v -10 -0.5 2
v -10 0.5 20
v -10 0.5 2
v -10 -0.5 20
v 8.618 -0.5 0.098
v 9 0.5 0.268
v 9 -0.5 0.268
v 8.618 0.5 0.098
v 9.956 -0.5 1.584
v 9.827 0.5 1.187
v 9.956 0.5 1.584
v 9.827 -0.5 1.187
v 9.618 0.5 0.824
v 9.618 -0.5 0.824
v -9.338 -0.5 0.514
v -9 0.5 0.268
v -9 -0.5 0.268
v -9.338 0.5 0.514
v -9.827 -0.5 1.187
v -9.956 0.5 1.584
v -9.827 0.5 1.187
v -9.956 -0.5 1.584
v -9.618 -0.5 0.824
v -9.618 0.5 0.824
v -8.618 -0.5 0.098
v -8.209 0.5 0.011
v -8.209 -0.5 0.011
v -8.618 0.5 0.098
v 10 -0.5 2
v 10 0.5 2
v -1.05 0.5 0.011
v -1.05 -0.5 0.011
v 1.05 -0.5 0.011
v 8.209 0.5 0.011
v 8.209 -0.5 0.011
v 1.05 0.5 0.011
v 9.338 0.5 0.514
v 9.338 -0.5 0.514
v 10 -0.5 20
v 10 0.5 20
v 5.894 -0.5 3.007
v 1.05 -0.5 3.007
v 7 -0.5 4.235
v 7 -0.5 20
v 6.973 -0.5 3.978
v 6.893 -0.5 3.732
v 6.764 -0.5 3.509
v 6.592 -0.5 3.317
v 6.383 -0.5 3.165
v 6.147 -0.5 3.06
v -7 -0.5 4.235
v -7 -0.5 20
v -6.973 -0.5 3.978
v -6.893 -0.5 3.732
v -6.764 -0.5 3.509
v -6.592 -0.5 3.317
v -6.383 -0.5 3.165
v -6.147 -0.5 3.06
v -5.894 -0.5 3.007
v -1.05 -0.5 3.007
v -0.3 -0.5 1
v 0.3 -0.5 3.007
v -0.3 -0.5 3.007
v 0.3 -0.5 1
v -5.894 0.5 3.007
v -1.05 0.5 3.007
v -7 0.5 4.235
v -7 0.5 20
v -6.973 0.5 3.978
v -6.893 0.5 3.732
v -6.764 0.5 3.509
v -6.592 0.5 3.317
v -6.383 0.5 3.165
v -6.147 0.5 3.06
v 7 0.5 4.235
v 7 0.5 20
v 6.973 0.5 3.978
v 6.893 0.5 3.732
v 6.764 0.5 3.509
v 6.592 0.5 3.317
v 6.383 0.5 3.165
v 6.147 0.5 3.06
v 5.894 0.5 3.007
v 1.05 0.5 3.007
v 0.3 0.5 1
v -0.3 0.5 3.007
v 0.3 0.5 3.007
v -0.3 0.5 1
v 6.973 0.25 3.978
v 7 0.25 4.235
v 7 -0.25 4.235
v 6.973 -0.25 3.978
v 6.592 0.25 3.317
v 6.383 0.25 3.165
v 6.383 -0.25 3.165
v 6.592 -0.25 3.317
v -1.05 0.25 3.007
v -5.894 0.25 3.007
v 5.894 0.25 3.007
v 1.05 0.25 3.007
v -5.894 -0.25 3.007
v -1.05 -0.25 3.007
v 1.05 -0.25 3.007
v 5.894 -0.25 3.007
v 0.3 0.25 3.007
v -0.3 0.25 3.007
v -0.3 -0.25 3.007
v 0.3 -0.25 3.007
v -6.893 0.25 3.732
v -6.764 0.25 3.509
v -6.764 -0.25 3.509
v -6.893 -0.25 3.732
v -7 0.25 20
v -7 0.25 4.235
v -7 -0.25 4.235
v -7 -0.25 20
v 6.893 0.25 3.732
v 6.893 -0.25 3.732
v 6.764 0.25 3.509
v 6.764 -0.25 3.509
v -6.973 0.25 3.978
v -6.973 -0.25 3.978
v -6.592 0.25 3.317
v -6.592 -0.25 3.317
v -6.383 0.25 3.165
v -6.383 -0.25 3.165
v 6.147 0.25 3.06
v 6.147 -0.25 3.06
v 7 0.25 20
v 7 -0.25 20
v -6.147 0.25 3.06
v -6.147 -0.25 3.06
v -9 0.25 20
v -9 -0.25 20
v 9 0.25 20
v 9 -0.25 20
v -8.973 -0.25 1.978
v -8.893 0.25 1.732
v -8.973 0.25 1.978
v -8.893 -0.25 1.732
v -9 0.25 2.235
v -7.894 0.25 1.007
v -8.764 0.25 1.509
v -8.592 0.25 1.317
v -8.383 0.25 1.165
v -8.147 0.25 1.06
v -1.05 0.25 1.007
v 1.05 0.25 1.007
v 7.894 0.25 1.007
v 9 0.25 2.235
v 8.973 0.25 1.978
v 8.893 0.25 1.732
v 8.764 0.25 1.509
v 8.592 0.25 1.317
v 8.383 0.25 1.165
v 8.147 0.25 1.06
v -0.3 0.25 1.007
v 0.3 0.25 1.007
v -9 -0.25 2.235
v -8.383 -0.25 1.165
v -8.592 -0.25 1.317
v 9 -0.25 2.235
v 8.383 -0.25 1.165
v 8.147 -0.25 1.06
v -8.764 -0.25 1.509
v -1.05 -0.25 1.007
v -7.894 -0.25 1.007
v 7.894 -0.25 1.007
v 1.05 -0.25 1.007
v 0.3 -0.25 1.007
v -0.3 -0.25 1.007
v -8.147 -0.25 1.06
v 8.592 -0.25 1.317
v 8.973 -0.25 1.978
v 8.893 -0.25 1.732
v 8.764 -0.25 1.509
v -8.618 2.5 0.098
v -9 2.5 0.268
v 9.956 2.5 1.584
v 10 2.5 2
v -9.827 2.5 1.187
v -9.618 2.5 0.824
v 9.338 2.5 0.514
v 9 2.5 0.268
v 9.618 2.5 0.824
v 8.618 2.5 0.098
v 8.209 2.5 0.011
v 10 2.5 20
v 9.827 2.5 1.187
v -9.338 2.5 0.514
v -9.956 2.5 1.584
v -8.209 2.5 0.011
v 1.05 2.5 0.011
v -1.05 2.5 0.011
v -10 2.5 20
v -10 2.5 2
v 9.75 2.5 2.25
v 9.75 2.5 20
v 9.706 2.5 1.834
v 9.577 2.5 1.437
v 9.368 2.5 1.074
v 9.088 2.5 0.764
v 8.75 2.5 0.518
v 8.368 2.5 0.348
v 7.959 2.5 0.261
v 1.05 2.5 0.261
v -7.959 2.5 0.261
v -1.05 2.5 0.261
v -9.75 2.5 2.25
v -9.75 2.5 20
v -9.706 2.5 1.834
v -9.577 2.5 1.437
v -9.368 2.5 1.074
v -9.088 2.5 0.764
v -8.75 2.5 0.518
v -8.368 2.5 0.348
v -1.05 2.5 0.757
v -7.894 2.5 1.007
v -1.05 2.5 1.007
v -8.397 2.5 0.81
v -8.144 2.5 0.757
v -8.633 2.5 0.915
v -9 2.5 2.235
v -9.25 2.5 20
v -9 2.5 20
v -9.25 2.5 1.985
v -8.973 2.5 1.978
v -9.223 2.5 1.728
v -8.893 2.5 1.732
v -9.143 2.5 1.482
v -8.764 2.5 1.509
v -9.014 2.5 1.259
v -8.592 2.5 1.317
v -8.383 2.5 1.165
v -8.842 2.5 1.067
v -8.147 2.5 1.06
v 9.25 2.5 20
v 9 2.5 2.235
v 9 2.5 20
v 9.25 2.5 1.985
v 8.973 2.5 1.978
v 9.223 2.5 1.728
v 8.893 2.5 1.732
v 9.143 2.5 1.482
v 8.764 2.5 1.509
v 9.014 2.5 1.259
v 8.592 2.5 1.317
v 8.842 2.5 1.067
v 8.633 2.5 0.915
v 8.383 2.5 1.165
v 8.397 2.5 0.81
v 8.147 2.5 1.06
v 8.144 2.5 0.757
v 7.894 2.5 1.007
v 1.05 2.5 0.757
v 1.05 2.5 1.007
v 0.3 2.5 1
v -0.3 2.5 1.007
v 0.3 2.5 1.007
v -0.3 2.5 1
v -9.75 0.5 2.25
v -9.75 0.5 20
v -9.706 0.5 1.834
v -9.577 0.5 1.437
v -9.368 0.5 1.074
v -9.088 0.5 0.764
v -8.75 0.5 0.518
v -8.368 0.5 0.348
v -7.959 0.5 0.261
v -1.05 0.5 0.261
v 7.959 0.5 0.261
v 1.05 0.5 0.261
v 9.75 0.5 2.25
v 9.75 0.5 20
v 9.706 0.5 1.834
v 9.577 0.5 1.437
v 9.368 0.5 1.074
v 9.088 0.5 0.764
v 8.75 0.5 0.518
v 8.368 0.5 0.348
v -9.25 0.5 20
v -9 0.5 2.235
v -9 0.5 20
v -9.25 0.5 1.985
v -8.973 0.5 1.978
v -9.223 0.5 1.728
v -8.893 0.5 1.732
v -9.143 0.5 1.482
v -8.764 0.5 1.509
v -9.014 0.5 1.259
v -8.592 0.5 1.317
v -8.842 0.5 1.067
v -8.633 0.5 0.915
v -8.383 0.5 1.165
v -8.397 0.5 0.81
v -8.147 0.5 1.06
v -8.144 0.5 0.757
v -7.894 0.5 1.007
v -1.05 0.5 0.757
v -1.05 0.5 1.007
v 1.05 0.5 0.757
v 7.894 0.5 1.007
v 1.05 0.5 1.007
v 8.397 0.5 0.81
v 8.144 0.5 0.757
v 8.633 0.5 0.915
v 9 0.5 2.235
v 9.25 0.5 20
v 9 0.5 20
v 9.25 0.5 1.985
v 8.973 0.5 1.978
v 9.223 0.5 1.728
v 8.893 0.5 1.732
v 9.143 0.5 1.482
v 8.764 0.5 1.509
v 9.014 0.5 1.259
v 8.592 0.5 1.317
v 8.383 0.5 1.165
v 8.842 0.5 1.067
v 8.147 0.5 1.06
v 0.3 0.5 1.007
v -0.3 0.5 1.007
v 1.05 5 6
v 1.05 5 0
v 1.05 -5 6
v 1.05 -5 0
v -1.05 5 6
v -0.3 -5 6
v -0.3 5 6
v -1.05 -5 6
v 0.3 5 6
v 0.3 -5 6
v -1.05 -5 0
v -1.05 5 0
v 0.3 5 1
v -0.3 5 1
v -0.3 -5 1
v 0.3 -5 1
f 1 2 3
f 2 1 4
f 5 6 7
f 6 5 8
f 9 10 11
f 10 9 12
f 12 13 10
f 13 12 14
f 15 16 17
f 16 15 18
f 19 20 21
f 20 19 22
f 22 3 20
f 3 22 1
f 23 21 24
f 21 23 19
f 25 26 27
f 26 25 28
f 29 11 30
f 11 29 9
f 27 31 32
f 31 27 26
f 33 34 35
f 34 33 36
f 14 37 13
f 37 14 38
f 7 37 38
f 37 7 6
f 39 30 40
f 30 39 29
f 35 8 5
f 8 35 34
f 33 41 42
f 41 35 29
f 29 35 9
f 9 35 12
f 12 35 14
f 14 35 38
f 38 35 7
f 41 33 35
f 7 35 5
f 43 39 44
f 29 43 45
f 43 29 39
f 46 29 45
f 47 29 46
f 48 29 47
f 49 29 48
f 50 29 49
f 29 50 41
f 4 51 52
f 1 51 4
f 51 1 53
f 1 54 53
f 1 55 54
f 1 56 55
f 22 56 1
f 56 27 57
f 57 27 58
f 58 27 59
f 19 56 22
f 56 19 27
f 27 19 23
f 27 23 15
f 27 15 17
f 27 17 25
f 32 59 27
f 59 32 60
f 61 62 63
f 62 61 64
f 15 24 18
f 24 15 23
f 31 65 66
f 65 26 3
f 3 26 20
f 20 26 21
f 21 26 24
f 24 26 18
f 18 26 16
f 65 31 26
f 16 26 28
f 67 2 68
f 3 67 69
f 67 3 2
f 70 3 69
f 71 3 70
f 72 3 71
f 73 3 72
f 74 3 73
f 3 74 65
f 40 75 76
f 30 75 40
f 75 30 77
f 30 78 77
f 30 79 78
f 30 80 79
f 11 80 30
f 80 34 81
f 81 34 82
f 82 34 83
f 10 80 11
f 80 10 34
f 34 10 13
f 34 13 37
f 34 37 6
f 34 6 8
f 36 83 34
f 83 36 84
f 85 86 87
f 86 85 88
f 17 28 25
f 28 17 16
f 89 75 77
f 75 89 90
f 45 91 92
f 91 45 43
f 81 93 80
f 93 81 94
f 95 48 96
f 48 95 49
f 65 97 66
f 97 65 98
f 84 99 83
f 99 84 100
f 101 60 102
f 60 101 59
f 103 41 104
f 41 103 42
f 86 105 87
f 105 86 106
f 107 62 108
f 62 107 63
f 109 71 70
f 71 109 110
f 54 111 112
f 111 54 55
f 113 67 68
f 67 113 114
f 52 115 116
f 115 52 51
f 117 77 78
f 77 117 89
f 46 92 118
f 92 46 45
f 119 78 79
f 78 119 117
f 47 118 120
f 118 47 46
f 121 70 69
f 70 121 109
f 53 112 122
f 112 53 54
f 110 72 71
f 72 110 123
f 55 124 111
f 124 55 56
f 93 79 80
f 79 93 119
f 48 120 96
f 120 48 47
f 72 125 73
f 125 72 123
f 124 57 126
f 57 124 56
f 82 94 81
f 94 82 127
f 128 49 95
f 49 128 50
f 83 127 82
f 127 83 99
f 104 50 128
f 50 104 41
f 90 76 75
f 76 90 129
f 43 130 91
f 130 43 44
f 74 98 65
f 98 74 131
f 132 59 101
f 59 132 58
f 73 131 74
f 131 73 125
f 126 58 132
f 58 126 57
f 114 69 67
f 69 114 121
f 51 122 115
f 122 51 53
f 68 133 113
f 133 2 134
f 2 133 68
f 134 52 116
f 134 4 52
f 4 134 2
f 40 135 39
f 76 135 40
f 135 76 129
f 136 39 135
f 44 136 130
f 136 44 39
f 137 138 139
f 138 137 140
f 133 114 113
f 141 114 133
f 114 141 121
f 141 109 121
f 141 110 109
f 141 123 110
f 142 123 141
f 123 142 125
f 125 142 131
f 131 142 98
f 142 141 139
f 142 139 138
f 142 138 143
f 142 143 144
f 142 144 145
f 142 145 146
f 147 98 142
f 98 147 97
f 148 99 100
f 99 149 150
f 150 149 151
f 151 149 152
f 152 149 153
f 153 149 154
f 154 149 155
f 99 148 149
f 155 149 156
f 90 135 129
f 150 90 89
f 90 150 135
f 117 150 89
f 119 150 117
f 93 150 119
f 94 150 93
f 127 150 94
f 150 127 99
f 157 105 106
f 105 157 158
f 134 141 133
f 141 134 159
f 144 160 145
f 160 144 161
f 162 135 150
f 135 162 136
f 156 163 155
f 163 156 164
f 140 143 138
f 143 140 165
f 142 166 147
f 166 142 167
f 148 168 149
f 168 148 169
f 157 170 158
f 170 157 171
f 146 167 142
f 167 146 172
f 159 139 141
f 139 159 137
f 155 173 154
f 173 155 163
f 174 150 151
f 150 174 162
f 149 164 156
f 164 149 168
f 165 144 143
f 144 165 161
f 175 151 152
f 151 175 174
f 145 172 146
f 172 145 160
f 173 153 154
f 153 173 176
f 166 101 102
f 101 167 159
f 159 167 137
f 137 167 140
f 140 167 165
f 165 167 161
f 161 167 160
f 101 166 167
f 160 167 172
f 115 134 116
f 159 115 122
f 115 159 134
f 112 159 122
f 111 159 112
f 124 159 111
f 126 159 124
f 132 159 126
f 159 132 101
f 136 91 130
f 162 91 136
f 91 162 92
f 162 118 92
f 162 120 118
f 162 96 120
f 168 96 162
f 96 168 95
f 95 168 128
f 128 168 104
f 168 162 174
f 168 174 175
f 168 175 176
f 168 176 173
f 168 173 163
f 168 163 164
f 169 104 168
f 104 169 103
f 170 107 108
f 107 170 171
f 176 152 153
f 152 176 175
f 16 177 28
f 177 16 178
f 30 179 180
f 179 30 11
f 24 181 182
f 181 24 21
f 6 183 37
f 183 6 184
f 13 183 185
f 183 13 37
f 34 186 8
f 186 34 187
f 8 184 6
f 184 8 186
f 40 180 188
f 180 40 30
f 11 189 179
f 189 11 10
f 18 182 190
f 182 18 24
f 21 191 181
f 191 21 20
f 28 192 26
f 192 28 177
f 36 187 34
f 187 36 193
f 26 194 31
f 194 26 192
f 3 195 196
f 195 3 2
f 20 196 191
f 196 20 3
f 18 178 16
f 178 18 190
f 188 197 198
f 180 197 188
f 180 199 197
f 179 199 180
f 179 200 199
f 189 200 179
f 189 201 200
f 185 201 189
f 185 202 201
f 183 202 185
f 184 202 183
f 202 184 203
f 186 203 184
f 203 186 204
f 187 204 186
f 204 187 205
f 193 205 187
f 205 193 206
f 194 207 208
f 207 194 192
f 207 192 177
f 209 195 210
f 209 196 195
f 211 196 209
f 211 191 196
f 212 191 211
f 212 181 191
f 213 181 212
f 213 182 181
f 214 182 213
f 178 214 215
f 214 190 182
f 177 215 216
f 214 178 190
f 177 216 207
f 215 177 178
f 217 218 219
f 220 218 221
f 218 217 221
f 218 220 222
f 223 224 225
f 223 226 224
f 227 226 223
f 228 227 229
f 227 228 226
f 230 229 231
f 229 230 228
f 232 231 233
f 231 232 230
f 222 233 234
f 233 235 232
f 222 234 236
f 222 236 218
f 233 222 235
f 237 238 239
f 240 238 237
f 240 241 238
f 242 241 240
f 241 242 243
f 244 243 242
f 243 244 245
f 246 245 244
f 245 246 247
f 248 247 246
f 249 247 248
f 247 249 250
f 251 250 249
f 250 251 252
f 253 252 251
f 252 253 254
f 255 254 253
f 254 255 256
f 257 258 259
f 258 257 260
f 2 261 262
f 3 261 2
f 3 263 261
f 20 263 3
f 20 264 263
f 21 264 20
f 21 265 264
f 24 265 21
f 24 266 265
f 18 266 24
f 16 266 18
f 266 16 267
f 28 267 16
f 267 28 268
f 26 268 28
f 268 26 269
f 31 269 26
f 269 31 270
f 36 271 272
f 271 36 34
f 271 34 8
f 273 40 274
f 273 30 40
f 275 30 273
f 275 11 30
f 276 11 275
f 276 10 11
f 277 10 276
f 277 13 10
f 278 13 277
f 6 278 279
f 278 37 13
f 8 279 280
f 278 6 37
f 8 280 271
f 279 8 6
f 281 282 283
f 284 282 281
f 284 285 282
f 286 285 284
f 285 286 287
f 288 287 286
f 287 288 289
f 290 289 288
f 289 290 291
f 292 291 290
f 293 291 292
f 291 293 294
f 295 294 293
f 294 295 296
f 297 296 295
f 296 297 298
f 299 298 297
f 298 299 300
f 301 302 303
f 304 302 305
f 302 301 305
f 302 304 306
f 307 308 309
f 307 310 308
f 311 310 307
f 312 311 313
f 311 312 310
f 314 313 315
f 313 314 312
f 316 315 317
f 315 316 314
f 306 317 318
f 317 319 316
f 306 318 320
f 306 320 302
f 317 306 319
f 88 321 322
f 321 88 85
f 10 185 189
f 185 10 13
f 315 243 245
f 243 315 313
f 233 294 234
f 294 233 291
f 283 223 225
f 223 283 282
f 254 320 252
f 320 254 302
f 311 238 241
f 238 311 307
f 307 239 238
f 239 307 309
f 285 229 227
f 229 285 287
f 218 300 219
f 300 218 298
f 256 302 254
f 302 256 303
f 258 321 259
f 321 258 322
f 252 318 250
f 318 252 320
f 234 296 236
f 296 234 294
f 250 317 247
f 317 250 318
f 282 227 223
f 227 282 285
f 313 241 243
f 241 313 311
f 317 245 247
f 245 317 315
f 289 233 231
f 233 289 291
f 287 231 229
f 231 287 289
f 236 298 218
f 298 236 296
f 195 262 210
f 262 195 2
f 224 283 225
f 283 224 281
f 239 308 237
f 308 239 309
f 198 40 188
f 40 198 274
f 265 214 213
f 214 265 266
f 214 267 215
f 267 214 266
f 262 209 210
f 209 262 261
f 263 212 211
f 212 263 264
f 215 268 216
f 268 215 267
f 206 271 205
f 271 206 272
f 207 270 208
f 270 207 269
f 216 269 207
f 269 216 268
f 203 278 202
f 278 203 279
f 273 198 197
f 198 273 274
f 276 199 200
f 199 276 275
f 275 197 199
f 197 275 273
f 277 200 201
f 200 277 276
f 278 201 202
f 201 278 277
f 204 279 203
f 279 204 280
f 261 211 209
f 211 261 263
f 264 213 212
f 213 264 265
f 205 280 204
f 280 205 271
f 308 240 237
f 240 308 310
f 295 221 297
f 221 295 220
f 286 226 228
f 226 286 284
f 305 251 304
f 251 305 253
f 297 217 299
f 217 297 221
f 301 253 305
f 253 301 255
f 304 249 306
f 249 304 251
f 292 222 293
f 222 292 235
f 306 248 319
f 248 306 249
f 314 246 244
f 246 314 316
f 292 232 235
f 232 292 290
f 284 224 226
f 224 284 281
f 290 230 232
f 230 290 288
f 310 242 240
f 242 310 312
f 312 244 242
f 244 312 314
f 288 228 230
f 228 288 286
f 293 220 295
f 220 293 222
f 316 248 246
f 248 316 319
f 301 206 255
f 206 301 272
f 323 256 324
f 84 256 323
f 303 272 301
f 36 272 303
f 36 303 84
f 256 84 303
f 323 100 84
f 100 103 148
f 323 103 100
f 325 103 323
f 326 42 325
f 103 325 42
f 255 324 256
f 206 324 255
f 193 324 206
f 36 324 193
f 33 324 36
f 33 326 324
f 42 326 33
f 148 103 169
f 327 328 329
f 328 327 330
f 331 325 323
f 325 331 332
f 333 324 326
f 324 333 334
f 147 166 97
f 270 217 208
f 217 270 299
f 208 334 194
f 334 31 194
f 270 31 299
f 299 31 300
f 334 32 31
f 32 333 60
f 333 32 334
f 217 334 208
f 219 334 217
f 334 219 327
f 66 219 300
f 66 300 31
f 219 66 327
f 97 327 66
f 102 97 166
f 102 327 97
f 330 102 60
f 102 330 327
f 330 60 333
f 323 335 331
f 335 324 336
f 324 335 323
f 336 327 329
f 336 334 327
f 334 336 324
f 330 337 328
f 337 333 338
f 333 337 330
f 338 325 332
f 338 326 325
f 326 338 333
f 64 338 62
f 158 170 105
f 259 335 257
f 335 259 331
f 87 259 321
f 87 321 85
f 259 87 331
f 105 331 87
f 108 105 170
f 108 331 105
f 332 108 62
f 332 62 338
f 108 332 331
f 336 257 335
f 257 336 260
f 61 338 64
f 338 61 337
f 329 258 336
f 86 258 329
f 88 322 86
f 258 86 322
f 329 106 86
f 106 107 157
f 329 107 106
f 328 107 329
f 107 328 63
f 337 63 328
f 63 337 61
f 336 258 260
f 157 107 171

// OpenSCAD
// file: CardBoardLibrary.scad
/* This is a library for the generation of cardboard mounts for replacing areas of plastic in 3D-printed parts with cardboard.*/

module linearCardBoardMount(length, height, base_height, depth, cardPer_thickness, align = "xcenter")
{
    if(align == "xcenter" || align == "X")
    {
        difference(){
        translate([-depth/2, 0, 0])cube([depth ,length , height]);
        translate([-cardPer_thickness/2, -0.05, base_height])cube([cardPer_thickness , length+1, height+1]);
        }
    }
    
    if(align == "xycenter" || align == "XY")
    {
        difference(){
        translate([-depth/2, -length/2, 0])cube([depth ,length , height]);
        translate([-cardPer_thickness/2, (-length/2)-0.5, base_height])cube([cardPer_thickness , length+1, height+1]);
        }
    }
    
    if(align == "center" || align == "XYZ")
    {
        difference(){
        translate([-depth/2, -length/2, -height/2])cube([depth ,length , height]);
        translate([-cardPer_thickness/2, (-length/2)-0.5, ( -height/2)+base_height])cube([cardPer_thickness , length+1, height+1]);}
    }
    
    if(align == "nocenter" || align == "")
    {
        difference(){
        cube([depth ,length , height]);
        translate([(-cardPer_thickness/2)+width/2, -0.5, base_height])cube([cardPer_thickness , length+1, height+1]);
        }
    }
}

module UShapeCardPer(height, width, depth, u_depth, mount_depth, cardPer_thickness, radius_outer, radius_inner)
{
    /*CardPer Window*//*
    radius_middle=(radius_outer+radius_inner)/2;
    radius_outerMiddle=(radius_outer+radius_middle)/2;
    difference()
    {
        //outer part
        UShape(height, width, depth, u_width, base_height, radius_outer, radius_inner);
        //cardper part
        translate([0,0,0])UShape(height+0.5, width-base_height, cardPer_thickness, width, base_height, radius_middle, radius_inner);
    }
    /*CardPer U-Slide
    #translate([0,u_width/2,0])UShape(height, width, u_width/2, u_width/4-cardPer_thickness/2, base_height/2-cardPer_thickness/2, radius_outer, radius_middle);
    translate([0,u_width/2,cardPer_thickness])
    UShape(height-cardPer_thickness*2, width-u_width/2-cardPer_thickness, u_width/2, u_width/4-cardPer_thickness/2, 
    base_height/2+cardPer_thickness/2, radius_middle, radius_middle);*/
    
    /*Window*/
    radius_middle=(radius_outer+radius_inner)/2;
    //inner part
    difference()
    {
        //outer frame
        UShape(height, width, u_depth, u_depth+mount_depth, radius_outer, radius_inner);
        //cardper part
        translate([0,0,u_depth])UShape(height, width-2*u_depth, cardPer_thickness, mount_depth*2, radius_inner, radius_inner/1.6);
    }
    
    difference()
    {
        //outer frame
        translate([0,depth/2+u_depth/2,0])UShape(height, width, depth, u_depth, radius_outer, radius_inner);
        //cardper part
        mount_pitch = u_depth/2-cardPer_thickness/2;
        translate([0,depth/2+u_depth/2,mount_pitch])UShape(height, width-2*mount_pitch, depth, cardPer_thickness, radius_outer, radius_inner);
    }
}

$fn=30;
//UShapeCardPer(height, width, depth, u_depth, mount_depth, cardPer_thickness, radius_outer, radius_inner)
UShapeCardPer(20,20, 2, 1, 2, 0.5, 2, 2/1.62);
//UShape(10, 10, 10, 2, 2, 2/1.62);
module UShape(height, width, u_depth, u_width, radius_outer, radius_inner)
{
    difference()
    {
        //outer part
        minkowski()
        {
            translate([-width/2+radius_outer,-u_depth/2,radius_outer])cube([width-radius_outer*2,u_depth-0.00001,height]);
            rotate([90,0,0])cylinder(0.00001,r=radius_outer);
        }
        //inner part
        translate([0,0,u_width])minkowski()
        {
            translate([(width-2*u_width)/-2+radius_inner,-u_depth/2+0.5,radius_inner])cube([width-u_width*2-radius_inner*2,u_depth,height*1.5]);
            rotate([90,0,0])cylinder(1,r=radius_inner);
        }
        //cut of the too long top at height
        translate([-width/2-.1,-u_depth/2-.1,height])cube([width+.2,u_depth+.2,height]);
        
    }
}
// main file
//Defaults
/*total_height = 4;
base_height = 1;
length = 3;
space_width = 0.6;
outer_width = space_width + 1;*/

total_height = 6;
base_height = 1;
length = 10;
space_width = 0.6;
outer_width = space_width + 1.5;

include<CardBoardLibrary.scad>

linearCardBoardMount(length, total_height, base_height, outer_width, space_width,"XY");
